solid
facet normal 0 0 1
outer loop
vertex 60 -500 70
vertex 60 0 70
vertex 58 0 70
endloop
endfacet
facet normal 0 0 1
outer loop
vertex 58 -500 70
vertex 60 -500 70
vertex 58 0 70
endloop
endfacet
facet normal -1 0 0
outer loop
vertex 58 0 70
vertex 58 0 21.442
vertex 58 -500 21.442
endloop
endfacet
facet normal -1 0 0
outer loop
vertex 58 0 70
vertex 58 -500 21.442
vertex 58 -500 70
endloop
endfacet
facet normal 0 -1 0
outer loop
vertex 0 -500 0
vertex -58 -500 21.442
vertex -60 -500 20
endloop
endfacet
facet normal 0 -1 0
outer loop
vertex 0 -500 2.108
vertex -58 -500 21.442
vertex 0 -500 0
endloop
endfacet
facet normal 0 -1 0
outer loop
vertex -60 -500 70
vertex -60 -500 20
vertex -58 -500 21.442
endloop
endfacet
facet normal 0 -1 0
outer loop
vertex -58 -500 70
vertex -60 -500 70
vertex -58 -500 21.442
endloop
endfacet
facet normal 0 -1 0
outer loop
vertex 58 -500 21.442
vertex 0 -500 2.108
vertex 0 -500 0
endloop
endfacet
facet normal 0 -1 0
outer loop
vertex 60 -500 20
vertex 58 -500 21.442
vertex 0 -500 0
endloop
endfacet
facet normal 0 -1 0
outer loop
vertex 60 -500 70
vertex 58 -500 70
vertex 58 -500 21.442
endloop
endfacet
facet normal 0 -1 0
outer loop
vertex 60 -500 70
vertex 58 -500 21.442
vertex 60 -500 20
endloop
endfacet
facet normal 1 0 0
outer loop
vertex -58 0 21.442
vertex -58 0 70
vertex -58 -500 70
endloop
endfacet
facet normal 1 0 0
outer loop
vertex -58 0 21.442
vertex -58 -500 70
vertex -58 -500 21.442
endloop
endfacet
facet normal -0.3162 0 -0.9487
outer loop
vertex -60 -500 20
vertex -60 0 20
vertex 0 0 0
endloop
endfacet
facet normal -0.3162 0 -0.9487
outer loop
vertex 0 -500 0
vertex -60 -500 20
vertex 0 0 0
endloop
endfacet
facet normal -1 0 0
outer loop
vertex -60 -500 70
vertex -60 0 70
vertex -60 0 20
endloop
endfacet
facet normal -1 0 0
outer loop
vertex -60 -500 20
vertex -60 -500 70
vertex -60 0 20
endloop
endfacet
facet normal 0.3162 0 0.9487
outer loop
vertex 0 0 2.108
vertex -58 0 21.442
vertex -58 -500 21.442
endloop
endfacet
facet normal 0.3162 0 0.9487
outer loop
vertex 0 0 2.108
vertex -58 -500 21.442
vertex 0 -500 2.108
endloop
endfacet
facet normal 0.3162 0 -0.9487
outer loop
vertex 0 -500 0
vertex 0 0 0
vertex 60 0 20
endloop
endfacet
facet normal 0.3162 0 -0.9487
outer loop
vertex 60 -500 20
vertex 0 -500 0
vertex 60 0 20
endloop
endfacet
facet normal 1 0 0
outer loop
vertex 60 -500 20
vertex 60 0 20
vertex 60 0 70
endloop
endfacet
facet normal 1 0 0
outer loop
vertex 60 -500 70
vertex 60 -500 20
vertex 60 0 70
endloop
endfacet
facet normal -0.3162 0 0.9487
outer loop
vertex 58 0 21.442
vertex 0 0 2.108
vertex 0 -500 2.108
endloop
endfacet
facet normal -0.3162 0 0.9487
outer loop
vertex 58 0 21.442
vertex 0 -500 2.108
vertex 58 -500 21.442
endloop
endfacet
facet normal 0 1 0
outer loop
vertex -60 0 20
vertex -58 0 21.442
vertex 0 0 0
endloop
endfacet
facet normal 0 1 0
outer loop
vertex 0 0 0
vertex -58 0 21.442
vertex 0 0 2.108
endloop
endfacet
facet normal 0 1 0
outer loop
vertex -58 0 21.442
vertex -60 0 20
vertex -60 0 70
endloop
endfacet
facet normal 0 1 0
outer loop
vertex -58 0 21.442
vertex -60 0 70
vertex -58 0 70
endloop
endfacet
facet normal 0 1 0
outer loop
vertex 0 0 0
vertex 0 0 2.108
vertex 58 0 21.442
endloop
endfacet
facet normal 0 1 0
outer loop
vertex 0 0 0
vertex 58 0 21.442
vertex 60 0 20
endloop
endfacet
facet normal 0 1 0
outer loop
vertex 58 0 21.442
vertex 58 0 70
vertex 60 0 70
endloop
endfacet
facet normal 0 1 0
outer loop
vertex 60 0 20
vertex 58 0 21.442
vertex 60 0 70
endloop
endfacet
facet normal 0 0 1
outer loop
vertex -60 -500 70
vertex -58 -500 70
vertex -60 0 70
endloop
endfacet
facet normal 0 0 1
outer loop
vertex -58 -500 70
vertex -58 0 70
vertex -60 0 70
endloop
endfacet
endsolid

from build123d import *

# Parameters (mm, degrees)
F1_DEPTH = 500
F2_T     = -2


with BuildPart() as f1:
    # F0 (on Front) → F1 (new body)
    with BuildSketch(Plane.XZ):
        Polygon((60, 70), (-60, 70), (-60, 20), (0, 0), (60, 20), align=None)
    extrude(amount=F1_DEPTH)

    # F2
    f2_openings = [f1.faces().sort_by_distance(p)[0] for p in [
        (0, -250, 70),
        (0, -500, 39.722222),
        (0, 0, 39.722222),
    ]]
    offset(amount=F2_T, openings=f2_openings)


solid = f1.part
